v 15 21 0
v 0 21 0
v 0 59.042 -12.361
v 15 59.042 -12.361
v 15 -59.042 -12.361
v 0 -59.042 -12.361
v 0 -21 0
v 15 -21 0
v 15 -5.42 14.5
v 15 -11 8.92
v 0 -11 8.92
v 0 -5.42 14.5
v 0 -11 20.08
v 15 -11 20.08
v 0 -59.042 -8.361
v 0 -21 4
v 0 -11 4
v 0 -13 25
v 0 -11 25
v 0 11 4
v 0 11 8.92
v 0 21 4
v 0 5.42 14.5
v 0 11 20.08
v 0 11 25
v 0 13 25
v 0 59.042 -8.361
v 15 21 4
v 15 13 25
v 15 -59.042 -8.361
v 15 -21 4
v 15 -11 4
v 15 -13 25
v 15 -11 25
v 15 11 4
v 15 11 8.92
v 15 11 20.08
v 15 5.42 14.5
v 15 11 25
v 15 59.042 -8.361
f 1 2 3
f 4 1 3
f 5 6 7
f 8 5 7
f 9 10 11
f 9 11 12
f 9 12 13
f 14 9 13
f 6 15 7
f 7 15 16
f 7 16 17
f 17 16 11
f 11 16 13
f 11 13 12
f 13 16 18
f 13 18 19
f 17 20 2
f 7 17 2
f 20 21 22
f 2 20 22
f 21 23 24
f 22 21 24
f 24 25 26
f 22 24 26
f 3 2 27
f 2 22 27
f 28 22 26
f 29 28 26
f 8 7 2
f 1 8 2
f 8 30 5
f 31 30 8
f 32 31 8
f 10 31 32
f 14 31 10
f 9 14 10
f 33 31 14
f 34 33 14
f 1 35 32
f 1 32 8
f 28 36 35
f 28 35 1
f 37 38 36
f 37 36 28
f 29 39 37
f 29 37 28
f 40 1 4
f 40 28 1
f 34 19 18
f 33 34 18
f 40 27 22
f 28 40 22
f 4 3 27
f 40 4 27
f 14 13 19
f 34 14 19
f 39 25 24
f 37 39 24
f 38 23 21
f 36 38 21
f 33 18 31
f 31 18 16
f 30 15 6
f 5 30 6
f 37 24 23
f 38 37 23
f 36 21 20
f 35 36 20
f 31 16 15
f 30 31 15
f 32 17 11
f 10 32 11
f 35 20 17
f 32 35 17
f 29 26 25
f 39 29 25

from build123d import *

# Parameters (mm, degrees)
F1_DEPTH = 15


# Not quite as in the source:
# - a feature names something its author has since deleted; it is built from what else it names


with BuildPart() as f1:
    # F0 (on Right) → F1 (new body)
    with BuildSketch(Plane.YZ):
        Polygon((5.42, 14.5), (11, 8.92), (11, 20.08), align=None)
        Polygon((-11, 20.08), (-11, 8.92), (-5.42, 14.5), align=None)
        Polygon((-21, 4), (-21, 0), (0, 0), (0, 4), (-11, 4), align=None)
        Polygon((0, 4), (0, 0), (21, 0), (21, 4), (11, 4), align=None)
        Polygon((11, 4), (21, 4), (13, 25), (11, 25), (11, 20.08), (11, 8.92), align=None)
        Polygon((-13, 25), (-21, 4), (-11, 4), (-11, 8.92), (-11, 20.08), (-11, 25), align=None)
        Polygon((21, 4), (21, 0), (59.0422606518, -12.360679775), (59.0422606518, -8.360679775), align=None)
        Polygon((-59.0422606518, -12.360679775), (-21, 0), (-21, 4), (-59.0422606518, -8.360679775), align=None)
    extrude(amount=F1_DEPTH)


solid = f1.part
